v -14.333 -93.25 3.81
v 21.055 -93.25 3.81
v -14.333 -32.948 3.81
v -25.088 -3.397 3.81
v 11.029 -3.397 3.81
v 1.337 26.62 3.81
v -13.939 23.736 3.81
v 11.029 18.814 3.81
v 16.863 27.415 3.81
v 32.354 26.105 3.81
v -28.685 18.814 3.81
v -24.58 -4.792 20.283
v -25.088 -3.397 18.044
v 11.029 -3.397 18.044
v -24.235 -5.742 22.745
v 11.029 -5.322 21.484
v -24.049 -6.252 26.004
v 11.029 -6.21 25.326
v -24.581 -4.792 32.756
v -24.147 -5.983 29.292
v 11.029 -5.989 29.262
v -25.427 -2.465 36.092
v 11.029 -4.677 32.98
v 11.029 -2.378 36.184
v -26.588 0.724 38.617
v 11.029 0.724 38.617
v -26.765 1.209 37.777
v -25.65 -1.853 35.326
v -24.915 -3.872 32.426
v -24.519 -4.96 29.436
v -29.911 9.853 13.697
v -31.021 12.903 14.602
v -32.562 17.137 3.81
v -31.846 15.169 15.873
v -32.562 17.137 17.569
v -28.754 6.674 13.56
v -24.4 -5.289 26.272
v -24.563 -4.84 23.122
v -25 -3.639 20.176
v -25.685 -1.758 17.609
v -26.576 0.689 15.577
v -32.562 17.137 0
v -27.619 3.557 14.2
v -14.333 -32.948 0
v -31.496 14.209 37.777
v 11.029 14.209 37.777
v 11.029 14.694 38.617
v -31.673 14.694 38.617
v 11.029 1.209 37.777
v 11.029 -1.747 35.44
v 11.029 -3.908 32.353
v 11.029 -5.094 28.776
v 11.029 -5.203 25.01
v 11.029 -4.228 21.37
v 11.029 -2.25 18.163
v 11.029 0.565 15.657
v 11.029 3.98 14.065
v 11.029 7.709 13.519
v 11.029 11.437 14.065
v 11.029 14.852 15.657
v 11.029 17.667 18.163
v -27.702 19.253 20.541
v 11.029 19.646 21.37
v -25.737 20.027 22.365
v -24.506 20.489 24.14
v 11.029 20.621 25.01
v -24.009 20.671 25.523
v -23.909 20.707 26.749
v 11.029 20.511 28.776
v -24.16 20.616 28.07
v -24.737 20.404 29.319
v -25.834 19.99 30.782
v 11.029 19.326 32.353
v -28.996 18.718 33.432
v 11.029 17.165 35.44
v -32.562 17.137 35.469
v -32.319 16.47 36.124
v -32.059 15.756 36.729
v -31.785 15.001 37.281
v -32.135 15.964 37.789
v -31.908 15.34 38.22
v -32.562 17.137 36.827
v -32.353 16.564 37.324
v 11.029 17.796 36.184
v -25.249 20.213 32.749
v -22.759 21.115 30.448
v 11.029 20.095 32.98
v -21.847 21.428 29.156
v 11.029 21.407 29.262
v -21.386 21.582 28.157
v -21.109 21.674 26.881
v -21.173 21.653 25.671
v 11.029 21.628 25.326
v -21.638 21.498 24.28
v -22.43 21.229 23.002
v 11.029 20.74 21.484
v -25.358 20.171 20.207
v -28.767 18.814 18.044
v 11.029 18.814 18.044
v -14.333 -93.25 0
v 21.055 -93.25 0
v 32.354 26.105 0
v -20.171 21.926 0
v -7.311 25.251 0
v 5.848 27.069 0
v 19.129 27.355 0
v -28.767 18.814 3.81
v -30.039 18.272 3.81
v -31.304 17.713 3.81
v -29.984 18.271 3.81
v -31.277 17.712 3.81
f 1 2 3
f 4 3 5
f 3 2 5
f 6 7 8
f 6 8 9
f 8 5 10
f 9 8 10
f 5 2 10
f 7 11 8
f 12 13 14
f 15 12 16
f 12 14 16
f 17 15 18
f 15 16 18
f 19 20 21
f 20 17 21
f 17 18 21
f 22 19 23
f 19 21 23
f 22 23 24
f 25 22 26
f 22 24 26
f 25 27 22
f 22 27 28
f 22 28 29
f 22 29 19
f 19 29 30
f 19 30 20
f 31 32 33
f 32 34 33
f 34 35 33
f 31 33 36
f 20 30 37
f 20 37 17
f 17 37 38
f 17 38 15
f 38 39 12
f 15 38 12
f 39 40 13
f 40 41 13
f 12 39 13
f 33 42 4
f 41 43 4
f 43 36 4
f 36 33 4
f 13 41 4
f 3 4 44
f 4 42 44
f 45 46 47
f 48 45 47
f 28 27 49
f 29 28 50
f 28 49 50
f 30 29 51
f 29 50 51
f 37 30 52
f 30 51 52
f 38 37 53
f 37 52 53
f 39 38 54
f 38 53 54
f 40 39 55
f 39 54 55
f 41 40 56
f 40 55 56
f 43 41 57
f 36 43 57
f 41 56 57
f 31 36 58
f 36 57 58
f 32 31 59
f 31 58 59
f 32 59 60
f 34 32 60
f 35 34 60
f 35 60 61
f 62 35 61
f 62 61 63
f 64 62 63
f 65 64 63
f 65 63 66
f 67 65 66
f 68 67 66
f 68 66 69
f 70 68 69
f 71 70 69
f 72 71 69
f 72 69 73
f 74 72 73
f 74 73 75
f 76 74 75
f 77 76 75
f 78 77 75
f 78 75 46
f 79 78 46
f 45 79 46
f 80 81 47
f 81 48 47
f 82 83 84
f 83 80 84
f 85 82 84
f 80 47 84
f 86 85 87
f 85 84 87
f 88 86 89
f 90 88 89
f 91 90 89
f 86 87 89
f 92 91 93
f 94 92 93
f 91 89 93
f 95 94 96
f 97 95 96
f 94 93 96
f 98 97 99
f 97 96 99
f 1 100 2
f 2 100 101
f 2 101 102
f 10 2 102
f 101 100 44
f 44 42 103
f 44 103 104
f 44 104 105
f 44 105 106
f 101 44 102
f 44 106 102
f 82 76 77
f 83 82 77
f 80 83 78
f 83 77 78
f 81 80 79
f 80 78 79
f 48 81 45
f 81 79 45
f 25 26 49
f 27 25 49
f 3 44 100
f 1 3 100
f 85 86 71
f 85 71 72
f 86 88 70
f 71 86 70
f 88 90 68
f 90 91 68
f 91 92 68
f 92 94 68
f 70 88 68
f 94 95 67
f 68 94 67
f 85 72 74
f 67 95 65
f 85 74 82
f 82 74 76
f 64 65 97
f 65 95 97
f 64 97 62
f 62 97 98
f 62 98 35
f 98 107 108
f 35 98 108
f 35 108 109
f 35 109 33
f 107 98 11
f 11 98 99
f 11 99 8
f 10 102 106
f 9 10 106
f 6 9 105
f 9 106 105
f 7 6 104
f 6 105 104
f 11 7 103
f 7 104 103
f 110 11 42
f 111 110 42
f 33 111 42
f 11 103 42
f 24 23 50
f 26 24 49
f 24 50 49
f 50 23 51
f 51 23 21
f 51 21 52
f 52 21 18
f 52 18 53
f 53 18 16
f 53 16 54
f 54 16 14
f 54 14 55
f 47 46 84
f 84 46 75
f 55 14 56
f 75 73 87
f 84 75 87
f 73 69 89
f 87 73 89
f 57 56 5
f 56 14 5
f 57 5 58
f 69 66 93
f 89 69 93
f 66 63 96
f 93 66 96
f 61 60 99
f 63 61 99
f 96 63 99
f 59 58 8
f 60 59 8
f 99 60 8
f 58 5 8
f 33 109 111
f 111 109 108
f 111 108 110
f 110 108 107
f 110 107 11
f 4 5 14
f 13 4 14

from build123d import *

# Parameters (mm, degrees)
F1_DEPTH = 3.81
F2_W     = 54.356
F2_H     = 38.1
F3_DEPTH = 50.8
F5_DEPTH = 54.357
F7_DEPTH = 38.6182152336


with BuildPart() as f1:
    # F0 (on Top) → F1 (new body)
    with BuildSketch(Plane.XY):
        with BuildLine():
            ThreePointArc((32.3535154368, 26.1046796118), (-0.7575616132, 26.3503201986), (-32.5620487044, 17.1373747646))
            Line((-32.5620487044, 17.1373747646), (32.3535154368, 26.1046796118))
        make_face()
        Polygon((32.3535154368, 26.1046796118), (-32.5620487044, 17.1373747646), (-14.3325939581, -32.94764052), (-14.3325939581, -93.2497044648), (21.0546860419, -93.2497044648), align=None)
    extrude(amount=F1_DEPTH)

    # F2 (on face) → F3 (join)
    with BuildSketch(Plane.XY.offset(3.81)):
        with Locations((-16.1494093879, 7.7088556692)):
            Rectangle(F2_W, F2_H)
        with BuildLine():
            Line((11.0285906121, 26.7588556692), (2.554207671, 26.7588556692))
            ThreePointArc((2.554207671, 26.7588556692), (-15.3877109544, 23.3488645961), (-32.5620487044, 17.1373747646))
            Line((-32.5620487044, 17.1373747646), (-22.1967154377, -11.3411443308))
            Line((-22.1967154377, -11.3411443308), (11.0285906121, -11.3411443308))
            Line((11.0285906121, -11.3411443308), (11.0285906121, 26.7588556692))
        make_face()
    extrude(amount=F3_DEPTH)

    # F4 (on face) → F5 (cut, through all)
    with BuildSketch(Plane.YZ.offset(11.0285906121)):
        with BuildLine():
            Line((0.7238556692, 38.6172152336), (1.2088556692, 37.777170592))
            ThreePointArc((1.2088556692, 37.777170592), (7.7088556692, 13.5188403428), (14.2088556692, 37.777170592))
            Line((14.2088556692, 37.777170592), (14.6938556692, 38.6172152336))
            ThreePointArc((14.6938556692, 38.6172152336), (21.4068223617, 29.2623068525), (18.8143789297, 18.0436852935))
            Line((18.8143789297, 18.0436852935), (18.8143789297, 3.81))
            Line((18.8143789297, 3.81), (26.7588556692, 3.81))
            Line((26.7588556692, 3.81), (26.7588556692, 54.61))
            Line((26.7588556692, 54.61), (-11.3411443308, 54.61))
            Line((-11.3411443308, 54.61), (-11.3411443308, 3.81))
            Line((-11.3411443308, 3.81), (-3.3966675913, 3.81))
            Line((-3.3966675913, 3.81), (-3.3966675913, 18.0436852935))
            ThreePointArc((-3.3966675913, 18.0436852935), (-5.9891110233, 29.2623068525), (0.7238556692, 38.6172152336))
        make_face()
    extrude(amount=-F5_DEPTH, mode=Mode.SUBTRACT)

    # F6 (on face) → F7 (cut, through all)
    with BuildSketch(Plane(origin=(0, 0, 0), x_dir=(1, 0, 0), z_dir=(0, 0, -1))):
        with BuildLine():
            ThreePointArc((-11.1417521231, -24.4255824736), (-22.048556528, -21.3594577958), (-32.5620487044, -17.1373747646))
            Line((-32.5620487044, -17.1373747646), (-22.9622920053, 9.2377399985))
            Line((-22.9622920053, 9.2377399985), (-52.2691048682, 17.8252514452))
            Line((-52.2691048682, 17.8252514452), (-60.0504353642, -34.5690436661))
            Line((-60.0504353642, -34.5690436661), (-11.1417521231, -24.4255824736))
        make_face()
    extrude(amount=-F7_DEPTH, mode=Mode.SUBTRACT)


solid = f1.part
